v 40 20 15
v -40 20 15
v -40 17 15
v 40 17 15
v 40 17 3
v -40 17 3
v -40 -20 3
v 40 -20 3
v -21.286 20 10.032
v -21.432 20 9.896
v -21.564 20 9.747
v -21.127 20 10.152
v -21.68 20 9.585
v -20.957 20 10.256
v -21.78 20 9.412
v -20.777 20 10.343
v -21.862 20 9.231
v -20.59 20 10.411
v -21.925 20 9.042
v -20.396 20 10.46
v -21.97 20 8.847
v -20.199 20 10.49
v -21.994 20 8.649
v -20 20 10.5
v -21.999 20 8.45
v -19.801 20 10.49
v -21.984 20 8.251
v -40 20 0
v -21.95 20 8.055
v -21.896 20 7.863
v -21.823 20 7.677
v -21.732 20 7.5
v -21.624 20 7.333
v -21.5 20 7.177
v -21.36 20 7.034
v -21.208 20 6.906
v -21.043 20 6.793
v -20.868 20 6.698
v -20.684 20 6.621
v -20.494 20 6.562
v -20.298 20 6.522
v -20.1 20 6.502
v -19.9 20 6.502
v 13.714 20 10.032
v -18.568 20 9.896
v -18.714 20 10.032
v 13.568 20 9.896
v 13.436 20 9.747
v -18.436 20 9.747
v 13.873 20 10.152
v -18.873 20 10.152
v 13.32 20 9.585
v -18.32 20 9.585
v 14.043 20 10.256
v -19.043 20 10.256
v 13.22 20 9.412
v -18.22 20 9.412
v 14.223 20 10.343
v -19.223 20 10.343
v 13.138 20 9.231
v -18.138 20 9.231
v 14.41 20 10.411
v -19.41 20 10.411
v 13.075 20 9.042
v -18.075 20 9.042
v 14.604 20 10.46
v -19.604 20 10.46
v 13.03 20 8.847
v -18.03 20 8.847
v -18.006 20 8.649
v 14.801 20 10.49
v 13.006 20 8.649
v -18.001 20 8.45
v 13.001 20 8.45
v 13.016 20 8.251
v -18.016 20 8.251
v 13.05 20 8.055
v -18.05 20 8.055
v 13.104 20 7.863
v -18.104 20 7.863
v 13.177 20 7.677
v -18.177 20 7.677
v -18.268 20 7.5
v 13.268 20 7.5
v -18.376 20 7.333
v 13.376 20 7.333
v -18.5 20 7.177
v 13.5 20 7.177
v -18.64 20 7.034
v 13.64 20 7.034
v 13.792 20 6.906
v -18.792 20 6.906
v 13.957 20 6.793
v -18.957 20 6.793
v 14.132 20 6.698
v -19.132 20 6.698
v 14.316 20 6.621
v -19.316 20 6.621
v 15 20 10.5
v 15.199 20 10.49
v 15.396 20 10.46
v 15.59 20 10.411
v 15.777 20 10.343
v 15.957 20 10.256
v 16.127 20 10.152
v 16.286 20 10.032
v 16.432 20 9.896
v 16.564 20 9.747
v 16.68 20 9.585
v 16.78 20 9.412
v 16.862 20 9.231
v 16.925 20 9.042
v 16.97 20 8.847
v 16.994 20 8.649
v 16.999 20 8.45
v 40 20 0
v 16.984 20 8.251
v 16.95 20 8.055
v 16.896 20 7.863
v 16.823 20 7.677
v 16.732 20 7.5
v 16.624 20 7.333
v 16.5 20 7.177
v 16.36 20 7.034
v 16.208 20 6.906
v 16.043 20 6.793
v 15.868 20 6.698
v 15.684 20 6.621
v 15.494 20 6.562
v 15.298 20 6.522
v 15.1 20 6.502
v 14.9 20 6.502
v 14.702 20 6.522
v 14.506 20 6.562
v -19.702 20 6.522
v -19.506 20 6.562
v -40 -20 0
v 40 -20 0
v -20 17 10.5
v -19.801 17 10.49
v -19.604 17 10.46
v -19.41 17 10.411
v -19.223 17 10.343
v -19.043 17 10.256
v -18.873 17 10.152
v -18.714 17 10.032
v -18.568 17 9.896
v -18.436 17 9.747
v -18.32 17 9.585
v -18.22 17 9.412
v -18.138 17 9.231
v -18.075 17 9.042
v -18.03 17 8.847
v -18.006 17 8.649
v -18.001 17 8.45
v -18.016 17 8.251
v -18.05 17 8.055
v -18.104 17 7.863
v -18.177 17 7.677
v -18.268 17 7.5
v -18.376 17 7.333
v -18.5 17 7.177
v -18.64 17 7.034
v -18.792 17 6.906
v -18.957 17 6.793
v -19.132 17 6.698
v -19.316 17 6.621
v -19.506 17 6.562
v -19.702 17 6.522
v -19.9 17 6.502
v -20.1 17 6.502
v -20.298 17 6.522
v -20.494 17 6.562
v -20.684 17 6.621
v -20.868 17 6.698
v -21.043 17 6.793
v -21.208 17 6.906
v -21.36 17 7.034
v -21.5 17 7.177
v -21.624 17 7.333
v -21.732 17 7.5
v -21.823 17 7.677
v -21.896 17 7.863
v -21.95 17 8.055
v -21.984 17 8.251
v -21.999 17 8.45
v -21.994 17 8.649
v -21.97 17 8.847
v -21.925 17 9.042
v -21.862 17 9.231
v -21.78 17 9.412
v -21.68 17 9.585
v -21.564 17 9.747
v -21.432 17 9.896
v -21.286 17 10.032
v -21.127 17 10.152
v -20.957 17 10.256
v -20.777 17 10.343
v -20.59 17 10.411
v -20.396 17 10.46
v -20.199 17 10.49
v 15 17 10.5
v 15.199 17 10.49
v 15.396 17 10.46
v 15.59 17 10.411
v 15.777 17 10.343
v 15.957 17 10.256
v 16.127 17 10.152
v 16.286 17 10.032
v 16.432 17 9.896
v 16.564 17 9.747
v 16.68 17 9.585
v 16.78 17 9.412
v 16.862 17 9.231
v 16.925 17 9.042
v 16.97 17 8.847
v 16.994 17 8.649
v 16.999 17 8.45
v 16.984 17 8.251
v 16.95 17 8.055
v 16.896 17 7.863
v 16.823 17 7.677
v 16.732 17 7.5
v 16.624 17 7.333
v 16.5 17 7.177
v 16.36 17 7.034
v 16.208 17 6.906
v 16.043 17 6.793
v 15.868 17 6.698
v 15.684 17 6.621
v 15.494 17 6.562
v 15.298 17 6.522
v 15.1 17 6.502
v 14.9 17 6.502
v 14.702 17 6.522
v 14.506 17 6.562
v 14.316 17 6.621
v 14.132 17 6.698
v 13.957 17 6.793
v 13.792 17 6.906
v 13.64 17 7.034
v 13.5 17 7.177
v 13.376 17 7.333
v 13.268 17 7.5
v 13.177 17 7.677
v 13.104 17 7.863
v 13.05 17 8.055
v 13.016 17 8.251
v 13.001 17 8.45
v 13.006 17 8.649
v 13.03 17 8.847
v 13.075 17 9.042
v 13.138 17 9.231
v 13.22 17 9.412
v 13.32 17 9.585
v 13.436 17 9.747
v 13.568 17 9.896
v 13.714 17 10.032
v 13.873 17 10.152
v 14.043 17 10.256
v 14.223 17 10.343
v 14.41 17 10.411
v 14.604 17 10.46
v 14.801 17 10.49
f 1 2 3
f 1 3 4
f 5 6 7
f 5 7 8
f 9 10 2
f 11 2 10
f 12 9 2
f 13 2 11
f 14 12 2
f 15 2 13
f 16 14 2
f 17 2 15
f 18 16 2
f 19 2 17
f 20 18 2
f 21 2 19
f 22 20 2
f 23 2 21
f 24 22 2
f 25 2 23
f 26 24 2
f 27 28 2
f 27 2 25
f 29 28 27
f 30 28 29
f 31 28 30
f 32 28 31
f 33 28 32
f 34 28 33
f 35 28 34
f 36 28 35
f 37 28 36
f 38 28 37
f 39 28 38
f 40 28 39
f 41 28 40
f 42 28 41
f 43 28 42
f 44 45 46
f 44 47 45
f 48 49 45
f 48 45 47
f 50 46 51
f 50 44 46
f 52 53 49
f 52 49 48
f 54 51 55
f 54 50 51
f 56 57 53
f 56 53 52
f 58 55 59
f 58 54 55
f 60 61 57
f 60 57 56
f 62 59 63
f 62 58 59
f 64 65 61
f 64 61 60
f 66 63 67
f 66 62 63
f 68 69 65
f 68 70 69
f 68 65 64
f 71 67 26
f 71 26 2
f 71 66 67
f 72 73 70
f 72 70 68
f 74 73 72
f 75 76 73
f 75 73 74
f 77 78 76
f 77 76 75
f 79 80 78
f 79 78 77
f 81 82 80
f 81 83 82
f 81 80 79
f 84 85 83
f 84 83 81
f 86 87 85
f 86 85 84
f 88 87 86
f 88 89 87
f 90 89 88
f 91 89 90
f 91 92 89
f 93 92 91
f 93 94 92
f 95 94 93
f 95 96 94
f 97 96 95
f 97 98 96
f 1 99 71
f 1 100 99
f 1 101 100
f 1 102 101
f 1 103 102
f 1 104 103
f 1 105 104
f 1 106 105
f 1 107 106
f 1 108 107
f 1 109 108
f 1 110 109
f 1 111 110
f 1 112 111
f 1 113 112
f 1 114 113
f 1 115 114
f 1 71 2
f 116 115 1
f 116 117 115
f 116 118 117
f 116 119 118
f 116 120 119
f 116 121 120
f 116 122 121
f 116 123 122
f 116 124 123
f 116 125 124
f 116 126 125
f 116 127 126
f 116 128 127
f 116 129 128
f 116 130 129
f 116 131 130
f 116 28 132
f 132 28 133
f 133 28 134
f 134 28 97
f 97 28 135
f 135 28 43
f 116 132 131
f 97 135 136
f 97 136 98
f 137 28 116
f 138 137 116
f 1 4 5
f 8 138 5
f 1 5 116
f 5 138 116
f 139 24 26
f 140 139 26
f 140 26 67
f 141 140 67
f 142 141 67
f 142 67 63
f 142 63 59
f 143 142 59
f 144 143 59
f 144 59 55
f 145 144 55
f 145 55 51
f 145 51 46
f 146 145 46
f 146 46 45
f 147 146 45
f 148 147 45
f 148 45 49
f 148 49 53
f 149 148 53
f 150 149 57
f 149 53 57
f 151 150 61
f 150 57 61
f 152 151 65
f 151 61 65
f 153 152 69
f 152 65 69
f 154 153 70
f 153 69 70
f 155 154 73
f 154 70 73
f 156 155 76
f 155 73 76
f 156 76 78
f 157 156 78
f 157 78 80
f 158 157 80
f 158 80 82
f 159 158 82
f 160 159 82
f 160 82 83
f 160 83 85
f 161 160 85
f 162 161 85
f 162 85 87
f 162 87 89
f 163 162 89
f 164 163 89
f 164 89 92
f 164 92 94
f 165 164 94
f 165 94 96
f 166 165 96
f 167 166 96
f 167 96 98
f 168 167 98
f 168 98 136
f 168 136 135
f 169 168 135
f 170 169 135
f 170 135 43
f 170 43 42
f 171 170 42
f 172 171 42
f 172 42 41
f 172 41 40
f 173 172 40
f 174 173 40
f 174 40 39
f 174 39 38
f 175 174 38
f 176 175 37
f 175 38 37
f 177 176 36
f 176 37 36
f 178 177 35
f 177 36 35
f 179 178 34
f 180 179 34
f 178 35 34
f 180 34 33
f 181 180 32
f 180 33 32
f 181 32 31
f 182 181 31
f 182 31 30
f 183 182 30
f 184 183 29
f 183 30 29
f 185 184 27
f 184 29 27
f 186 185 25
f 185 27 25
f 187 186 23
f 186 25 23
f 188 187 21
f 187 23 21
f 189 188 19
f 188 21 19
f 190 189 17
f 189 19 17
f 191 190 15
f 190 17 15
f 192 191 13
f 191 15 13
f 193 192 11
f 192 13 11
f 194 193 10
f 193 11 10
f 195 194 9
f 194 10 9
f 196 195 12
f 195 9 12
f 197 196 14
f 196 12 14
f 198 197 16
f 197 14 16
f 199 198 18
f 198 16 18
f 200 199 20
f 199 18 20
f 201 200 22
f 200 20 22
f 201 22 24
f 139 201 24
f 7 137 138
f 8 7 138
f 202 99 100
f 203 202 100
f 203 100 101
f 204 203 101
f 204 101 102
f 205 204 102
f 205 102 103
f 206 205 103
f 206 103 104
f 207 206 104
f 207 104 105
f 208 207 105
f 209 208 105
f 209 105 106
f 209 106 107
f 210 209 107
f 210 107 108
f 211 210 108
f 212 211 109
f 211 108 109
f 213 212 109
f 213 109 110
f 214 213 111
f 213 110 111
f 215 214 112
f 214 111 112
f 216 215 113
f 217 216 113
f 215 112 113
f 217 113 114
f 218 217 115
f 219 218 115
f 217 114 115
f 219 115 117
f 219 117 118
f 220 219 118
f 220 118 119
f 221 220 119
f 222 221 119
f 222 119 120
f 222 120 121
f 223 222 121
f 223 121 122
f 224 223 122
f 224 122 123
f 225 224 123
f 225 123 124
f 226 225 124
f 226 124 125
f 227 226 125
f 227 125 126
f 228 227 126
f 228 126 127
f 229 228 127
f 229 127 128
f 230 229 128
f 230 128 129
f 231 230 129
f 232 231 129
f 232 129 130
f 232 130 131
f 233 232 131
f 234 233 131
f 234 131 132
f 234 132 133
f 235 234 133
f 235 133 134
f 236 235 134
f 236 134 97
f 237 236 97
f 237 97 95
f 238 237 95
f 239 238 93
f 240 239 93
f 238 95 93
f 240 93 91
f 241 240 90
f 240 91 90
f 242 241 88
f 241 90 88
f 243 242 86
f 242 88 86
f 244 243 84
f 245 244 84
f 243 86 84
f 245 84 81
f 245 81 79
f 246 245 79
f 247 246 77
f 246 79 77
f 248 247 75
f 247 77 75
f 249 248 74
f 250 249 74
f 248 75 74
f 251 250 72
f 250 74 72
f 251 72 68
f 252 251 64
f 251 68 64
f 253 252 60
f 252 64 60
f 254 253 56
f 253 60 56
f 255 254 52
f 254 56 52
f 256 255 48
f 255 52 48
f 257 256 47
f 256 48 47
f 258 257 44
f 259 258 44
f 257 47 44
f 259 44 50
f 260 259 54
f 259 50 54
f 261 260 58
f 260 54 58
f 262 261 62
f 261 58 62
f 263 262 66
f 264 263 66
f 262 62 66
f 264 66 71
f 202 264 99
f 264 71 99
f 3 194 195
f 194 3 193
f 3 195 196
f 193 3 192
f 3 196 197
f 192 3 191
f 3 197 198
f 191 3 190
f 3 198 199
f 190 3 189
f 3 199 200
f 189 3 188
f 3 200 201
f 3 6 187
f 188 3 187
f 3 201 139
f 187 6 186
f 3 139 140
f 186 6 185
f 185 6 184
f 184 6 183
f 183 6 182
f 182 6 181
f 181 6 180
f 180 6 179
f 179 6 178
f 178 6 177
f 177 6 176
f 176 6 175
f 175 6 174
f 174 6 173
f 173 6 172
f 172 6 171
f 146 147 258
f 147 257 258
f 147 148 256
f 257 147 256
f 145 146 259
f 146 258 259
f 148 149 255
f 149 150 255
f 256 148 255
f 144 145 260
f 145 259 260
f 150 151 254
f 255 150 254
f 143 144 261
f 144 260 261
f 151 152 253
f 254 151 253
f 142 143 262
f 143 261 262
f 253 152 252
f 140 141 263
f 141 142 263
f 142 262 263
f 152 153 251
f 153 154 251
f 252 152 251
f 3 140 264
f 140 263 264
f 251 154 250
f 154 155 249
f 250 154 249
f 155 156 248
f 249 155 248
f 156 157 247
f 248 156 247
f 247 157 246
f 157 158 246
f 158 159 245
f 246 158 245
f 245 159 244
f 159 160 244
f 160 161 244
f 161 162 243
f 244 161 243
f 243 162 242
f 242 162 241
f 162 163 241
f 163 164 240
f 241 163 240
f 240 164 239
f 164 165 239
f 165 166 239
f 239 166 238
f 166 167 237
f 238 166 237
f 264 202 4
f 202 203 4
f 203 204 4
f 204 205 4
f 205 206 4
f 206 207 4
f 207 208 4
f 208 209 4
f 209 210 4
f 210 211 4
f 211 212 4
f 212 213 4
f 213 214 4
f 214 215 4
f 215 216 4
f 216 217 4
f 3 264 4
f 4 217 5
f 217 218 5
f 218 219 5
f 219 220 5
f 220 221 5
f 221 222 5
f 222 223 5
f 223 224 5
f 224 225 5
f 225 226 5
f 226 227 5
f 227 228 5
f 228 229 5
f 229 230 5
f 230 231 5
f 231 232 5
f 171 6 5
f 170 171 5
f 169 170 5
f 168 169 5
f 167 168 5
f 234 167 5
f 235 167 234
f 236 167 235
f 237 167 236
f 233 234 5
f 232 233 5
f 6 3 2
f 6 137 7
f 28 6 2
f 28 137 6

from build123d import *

# Parameters (mm, degrees)
SKETCH1_W           = 80
SKETCH1_H           = 40
BOSS_EXTRUDE1_DEPTH = 3
SKETCH2_W           = 80
SKETCH2_H           = 3
BOSS_EXTRUDE2_DEPTH = 12
SKETCH3_R           = 2
CUT_EXTRUDE1_DEPTH  = 12


with BuildPart() as part:
    # Sketch1 → Boss-Extrude1 (new body)
    with BuildSketch(Plane.XY):
        Rectangle(SKETCH1_W, SKETCH1_H)
    extrude(amount=BOSS_EXTRUDE1_DEPTH)

    # Sketch2 → Boss-Extrude2 (add)
    with BuildSketch(Plane.XY.offset(3)):
        with Locations((0, 18.5)):
            Rectangle(SKETCH2_W, SKETCH2_H)
    extrude(amount=BOSS_EXTRUDE2_DEPTH)

    # Sketch3 → Cut-Extrude1 (cut)
    with BuildSketch(Plane(origin=(0, 20, 0), x_dir=(1, 0, 0), z_dir=(0, 1, 0))):
        with Locations(Location((15, -8.5, 0), (0, 0, 270))):
            Circle(SKETCH3_R)
        with Locations(Location((-20, -8.5, 0), (0, 0, 270))):
            Circle(SKETCH3_R)
    extrude(amount=-CUT_EXTRUDE1_DEPTH, mode=Mode.SUBTRACT)


solid = part.part
